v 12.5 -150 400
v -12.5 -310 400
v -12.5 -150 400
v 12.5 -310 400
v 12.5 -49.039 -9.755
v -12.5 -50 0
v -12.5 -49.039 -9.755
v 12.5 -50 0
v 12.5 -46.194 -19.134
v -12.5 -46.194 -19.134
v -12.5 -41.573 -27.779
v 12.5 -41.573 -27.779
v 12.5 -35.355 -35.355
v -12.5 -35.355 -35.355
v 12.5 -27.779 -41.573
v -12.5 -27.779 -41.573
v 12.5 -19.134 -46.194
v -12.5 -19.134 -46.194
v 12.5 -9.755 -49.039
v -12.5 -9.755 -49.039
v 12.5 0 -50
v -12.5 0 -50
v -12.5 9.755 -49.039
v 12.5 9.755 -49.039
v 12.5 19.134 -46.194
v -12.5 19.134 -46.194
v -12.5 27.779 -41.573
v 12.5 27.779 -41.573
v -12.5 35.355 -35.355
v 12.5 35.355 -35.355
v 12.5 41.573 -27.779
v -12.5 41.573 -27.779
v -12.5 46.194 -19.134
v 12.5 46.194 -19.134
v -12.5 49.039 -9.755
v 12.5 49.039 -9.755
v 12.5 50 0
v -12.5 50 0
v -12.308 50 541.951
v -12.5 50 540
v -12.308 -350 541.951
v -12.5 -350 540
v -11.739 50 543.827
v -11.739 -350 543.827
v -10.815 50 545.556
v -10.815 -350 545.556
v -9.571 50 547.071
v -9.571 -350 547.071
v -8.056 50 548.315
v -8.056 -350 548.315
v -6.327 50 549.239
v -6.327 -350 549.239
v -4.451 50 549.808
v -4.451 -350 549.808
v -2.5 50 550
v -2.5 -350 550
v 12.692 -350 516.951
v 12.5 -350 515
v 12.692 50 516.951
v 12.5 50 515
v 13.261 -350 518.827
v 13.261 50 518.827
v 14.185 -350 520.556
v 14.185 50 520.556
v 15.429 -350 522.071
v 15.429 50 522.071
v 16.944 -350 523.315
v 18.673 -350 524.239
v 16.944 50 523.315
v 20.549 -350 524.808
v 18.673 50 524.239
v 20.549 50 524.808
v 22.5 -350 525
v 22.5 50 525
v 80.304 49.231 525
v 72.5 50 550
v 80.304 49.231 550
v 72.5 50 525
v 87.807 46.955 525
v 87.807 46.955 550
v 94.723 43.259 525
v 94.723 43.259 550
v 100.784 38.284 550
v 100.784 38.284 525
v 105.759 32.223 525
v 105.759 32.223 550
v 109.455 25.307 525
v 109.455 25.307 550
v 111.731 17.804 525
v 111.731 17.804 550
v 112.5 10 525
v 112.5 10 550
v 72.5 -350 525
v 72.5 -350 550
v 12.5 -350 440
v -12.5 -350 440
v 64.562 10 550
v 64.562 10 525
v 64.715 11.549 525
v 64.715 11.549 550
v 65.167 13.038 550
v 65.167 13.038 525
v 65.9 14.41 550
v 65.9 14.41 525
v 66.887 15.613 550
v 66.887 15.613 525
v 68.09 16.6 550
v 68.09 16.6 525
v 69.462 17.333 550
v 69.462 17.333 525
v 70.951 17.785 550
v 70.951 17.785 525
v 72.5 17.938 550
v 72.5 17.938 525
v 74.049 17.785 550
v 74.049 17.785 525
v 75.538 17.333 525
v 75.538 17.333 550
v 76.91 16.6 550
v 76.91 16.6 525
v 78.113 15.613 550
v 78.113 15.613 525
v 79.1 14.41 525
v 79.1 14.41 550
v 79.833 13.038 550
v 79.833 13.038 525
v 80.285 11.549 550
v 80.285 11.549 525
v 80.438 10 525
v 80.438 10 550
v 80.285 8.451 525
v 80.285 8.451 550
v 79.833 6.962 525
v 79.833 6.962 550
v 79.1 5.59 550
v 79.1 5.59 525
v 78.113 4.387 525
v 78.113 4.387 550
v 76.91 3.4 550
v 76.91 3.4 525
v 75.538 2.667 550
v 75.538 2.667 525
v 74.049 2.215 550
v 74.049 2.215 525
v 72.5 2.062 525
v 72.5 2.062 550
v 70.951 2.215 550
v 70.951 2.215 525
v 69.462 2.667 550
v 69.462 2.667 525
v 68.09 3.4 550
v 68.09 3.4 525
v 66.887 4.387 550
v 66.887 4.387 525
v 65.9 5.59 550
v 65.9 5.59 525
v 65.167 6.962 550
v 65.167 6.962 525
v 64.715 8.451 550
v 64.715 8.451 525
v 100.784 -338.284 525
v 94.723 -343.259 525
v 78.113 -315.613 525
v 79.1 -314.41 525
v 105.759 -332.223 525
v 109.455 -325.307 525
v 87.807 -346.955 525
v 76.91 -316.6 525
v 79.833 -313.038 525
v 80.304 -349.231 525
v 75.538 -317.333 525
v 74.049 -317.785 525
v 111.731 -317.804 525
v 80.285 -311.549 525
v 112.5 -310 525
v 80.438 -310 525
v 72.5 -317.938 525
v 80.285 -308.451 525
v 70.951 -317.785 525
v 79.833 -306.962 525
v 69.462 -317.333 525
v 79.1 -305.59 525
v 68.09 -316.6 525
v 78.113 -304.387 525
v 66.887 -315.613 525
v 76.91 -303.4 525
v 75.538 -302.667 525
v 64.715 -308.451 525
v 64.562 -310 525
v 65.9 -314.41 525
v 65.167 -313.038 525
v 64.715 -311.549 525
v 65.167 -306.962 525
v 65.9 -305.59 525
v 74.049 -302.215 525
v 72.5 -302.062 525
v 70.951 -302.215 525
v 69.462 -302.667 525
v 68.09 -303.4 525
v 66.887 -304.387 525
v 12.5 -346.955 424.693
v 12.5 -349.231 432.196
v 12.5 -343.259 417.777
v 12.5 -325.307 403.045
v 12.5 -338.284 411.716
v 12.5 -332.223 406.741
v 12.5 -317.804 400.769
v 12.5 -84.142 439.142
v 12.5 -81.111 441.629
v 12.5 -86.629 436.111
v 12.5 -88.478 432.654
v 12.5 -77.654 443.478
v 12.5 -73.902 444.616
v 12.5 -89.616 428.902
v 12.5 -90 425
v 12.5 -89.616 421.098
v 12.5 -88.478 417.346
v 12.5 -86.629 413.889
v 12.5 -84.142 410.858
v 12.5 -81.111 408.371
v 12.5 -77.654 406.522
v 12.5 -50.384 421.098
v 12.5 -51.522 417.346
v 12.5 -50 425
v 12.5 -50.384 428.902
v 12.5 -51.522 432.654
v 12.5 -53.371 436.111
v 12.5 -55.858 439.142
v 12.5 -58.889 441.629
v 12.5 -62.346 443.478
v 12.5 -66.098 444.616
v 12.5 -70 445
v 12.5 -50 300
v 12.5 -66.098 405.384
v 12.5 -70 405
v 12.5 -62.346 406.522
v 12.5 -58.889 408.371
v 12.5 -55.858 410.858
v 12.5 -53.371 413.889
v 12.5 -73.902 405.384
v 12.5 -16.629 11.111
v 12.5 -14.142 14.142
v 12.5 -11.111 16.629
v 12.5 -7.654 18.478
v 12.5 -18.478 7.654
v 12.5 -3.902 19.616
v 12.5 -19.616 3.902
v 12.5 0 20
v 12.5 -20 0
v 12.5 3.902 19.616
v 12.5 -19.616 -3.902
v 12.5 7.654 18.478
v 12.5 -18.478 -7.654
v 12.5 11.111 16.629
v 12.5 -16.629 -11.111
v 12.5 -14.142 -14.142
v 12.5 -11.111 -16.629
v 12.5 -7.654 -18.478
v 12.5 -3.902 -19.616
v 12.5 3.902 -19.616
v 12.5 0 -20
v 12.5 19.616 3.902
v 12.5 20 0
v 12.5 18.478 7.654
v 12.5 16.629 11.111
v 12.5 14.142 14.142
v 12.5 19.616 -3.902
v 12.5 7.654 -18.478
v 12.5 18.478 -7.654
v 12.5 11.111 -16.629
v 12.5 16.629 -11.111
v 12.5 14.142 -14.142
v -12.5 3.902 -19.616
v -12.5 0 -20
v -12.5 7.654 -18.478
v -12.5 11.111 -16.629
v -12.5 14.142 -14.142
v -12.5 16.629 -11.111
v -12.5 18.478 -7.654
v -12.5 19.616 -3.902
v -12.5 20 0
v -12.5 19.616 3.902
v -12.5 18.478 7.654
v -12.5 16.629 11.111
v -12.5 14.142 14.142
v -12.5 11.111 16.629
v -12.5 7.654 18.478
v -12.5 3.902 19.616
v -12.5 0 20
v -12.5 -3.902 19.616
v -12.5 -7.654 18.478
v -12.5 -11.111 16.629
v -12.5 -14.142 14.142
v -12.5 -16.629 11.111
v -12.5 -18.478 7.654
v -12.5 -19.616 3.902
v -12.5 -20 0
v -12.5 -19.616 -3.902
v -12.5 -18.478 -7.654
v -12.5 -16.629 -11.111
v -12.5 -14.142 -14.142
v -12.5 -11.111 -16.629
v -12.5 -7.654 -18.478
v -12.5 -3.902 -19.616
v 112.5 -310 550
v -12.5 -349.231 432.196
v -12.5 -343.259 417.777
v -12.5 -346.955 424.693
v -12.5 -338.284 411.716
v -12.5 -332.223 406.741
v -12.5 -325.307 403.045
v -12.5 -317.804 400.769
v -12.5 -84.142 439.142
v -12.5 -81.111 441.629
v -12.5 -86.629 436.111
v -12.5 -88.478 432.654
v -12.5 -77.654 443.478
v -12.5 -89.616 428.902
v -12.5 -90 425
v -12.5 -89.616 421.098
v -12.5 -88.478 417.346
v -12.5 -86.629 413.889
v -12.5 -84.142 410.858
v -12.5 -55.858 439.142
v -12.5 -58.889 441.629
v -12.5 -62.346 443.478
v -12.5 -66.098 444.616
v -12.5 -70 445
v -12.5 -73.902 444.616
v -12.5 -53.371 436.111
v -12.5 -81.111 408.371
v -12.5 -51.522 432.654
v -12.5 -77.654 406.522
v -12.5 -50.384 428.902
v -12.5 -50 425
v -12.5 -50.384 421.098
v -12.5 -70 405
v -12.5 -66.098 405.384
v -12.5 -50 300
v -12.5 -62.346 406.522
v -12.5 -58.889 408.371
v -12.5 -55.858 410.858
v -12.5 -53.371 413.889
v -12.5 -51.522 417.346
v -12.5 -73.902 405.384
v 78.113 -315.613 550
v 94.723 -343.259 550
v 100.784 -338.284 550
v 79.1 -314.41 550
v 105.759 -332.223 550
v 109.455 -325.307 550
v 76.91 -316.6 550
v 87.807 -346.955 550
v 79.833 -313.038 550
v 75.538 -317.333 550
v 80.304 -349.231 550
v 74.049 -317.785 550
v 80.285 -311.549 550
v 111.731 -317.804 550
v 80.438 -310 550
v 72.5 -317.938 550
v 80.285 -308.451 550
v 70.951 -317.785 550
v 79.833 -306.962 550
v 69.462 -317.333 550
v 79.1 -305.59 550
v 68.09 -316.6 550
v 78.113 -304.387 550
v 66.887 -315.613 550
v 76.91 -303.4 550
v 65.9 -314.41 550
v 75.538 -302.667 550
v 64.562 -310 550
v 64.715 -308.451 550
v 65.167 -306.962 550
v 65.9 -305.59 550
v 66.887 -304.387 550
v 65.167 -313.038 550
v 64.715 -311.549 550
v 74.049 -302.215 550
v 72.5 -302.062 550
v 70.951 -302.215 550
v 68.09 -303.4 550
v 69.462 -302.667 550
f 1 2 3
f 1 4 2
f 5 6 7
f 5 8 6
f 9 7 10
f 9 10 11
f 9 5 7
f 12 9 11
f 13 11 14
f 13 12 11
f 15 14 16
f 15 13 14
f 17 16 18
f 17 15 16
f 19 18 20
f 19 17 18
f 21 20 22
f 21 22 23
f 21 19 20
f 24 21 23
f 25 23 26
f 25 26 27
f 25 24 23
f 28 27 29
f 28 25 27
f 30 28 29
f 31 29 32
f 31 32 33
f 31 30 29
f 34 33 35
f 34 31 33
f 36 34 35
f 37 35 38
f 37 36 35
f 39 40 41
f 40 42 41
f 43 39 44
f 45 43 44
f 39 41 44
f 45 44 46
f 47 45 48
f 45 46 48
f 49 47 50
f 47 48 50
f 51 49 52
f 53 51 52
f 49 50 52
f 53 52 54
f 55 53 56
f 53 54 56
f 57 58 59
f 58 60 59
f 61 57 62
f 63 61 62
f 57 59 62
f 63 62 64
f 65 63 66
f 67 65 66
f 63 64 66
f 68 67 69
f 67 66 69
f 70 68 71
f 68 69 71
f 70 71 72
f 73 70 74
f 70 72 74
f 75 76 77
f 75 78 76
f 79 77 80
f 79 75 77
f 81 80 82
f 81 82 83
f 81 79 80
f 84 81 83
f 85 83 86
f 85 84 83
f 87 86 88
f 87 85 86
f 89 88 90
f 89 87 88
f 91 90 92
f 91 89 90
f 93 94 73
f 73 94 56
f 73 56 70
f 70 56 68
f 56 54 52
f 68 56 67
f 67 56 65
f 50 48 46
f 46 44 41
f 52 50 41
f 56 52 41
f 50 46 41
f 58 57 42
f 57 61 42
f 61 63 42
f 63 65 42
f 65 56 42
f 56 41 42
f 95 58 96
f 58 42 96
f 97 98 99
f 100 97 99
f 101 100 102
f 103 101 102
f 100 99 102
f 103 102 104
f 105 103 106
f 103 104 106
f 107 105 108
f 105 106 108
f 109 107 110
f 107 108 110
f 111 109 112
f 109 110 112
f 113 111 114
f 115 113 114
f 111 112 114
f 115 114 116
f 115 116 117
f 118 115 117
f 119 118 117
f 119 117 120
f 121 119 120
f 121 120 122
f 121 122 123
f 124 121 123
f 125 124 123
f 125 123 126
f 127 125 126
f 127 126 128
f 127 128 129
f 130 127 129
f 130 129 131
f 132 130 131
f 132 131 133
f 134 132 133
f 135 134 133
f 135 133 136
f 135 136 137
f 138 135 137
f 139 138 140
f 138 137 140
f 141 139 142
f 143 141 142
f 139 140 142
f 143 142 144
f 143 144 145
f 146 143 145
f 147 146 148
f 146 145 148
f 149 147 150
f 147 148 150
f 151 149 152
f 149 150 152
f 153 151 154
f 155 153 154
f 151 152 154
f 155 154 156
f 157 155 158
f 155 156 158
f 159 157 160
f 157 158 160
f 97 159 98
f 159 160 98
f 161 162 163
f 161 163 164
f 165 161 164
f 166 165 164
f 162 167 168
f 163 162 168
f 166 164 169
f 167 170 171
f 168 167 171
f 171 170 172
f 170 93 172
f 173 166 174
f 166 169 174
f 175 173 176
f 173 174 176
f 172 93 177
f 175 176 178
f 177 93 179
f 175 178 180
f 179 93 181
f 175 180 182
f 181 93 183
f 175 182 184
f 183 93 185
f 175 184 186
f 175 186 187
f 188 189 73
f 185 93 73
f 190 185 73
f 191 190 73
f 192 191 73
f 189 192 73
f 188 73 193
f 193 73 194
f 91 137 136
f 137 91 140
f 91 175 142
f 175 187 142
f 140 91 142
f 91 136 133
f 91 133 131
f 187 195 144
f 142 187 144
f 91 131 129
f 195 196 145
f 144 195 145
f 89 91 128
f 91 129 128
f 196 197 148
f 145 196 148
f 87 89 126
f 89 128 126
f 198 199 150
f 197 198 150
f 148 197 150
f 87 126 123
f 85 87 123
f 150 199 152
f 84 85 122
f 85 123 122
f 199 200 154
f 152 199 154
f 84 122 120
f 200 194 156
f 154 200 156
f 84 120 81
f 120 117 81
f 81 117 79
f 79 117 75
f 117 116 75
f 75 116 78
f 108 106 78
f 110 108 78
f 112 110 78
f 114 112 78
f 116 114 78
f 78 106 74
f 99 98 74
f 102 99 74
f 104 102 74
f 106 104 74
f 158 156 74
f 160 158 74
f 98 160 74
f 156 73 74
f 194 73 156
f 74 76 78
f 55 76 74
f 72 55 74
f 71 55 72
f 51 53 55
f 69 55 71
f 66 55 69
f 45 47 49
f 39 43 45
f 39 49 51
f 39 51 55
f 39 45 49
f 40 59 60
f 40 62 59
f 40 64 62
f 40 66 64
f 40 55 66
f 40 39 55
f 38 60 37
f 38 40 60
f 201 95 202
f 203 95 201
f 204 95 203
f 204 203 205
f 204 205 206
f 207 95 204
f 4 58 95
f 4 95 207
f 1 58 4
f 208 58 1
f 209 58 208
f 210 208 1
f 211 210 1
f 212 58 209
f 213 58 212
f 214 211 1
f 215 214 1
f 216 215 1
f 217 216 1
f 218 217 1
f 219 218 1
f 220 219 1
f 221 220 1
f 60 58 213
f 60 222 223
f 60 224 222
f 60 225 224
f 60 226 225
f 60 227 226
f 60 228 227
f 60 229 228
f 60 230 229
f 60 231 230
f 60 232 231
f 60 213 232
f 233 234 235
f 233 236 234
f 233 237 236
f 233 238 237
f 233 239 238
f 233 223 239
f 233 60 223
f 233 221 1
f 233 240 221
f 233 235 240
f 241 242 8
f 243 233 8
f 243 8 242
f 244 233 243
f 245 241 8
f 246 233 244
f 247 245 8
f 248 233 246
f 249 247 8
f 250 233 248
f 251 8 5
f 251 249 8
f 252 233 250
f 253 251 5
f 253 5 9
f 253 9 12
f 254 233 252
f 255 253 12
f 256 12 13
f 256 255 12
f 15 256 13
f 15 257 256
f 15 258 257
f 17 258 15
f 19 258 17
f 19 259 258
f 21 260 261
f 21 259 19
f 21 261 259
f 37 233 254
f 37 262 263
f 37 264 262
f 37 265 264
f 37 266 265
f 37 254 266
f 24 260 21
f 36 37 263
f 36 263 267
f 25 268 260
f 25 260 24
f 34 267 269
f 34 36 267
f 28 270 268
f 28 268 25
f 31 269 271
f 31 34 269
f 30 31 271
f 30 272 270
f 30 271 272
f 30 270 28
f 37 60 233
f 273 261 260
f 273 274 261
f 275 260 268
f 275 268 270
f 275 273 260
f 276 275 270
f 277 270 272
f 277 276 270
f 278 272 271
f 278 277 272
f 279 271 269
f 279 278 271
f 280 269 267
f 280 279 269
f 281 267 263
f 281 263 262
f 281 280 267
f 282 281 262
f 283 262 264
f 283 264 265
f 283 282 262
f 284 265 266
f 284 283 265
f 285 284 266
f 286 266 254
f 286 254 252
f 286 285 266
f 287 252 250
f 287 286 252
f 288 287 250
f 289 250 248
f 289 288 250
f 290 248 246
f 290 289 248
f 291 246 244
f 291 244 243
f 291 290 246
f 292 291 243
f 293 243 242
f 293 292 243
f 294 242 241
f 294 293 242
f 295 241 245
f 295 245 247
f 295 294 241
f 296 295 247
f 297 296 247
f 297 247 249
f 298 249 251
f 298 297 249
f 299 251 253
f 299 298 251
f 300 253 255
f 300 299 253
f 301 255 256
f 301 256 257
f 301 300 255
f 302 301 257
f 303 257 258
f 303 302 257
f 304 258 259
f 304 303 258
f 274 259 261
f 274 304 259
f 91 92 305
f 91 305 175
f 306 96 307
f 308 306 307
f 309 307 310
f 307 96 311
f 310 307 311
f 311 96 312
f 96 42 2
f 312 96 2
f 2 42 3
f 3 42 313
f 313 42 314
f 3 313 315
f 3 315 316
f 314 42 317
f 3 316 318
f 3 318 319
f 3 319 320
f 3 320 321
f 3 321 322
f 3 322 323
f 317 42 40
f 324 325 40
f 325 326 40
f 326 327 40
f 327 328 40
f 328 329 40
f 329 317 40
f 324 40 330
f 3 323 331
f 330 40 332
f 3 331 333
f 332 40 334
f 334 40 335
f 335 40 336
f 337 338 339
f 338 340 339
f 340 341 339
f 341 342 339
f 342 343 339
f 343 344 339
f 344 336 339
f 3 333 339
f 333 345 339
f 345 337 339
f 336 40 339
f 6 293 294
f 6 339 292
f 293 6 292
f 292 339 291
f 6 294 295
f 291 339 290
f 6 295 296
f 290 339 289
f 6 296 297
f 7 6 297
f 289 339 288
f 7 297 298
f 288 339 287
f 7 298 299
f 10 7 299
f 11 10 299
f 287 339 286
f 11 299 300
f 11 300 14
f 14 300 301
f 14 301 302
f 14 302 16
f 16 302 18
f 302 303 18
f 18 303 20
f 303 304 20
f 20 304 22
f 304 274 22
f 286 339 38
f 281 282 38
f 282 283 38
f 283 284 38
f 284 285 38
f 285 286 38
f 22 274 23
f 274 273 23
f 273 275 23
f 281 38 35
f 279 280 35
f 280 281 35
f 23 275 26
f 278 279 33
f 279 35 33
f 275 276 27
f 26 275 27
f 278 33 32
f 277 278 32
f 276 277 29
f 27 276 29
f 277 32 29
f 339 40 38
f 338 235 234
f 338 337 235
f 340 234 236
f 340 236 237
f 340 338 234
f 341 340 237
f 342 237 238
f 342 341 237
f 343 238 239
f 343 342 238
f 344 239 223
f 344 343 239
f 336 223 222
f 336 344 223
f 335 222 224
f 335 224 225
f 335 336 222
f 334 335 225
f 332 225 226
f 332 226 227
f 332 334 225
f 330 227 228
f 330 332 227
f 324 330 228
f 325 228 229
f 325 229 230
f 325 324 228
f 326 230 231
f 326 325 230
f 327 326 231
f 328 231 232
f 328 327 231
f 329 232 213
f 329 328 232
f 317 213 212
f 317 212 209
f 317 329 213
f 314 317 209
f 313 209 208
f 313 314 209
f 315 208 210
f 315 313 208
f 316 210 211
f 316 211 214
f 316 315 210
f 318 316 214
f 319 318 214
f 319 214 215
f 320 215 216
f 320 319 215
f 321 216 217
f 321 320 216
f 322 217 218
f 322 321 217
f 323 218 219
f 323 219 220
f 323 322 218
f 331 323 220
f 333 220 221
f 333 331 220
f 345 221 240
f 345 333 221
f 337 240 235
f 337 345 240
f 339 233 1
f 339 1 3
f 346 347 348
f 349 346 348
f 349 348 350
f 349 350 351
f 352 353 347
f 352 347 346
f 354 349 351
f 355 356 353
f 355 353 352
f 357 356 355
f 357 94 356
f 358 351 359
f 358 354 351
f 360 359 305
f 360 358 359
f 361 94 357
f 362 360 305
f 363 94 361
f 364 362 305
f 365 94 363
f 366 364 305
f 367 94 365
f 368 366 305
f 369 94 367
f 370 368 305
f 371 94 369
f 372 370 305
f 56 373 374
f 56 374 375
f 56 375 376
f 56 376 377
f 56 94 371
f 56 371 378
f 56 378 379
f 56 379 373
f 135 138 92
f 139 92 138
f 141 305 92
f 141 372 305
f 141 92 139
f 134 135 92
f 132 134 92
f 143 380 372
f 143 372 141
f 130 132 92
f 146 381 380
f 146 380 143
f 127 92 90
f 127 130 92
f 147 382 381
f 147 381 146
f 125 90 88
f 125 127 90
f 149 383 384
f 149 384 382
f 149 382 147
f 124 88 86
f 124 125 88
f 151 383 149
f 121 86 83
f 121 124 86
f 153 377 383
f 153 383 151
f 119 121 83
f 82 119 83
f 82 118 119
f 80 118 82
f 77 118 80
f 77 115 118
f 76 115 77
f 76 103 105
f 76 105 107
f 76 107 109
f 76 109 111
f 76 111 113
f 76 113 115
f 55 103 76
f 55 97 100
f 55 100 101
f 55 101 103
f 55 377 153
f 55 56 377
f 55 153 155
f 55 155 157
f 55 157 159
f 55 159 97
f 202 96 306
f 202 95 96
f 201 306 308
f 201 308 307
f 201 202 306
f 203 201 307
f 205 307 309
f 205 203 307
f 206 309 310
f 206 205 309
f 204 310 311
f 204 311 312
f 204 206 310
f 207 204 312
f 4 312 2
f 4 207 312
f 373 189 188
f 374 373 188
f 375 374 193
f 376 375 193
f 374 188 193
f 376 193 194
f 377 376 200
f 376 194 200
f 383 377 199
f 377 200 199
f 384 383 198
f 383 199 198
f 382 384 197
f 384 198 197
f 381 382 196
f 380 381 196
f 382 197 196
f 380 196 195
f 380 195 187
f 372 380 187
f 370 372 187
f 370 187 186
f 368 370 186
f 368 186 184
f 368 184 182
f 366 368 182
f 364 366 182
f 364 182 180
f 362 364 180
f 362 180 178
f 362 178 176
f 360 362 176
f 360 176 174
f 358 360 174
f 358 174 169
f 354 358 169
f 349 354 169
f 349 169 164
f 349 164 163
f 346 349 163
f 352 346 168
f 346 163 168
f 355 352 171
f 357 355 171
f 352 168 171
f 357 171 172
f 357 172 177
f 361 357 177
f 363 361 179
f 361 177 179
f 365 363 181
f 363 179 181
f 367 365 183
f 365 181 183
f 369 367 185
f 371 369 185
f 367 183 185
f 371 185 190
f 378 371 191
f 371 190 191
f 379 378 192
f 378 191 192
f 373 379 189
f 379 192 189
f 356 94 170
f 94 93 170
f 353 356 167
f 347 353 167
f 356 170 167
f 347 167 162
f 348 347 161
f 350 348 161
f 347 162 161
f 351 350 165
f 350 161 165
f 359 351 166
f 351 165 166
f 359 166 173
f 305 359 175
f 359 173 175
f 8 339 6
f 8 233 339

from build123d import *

# Parameters (mm, degrees)
SKETCH1_R                    = 20
EXTRUDE1_DEPTH               = 12.5
SKETCH2_W                    = 25
SKETCH2_H                    = 400
EXTRUDE2_DEPTH               = 100
FILLET1_R                    = 40
F_5_8_0_625_DIAMETER_HOLE1_D = 15.875
CHAMFER1_SIZE                = 100
FILLET2_R                    = 10


with BuildPart() as part:
    # Sketch1 → Extrude1 (new, symmetric)
    with BuildSketch(Plane(origin=(0, 0, 0), x_dir=(0, 0, -1), z_dir=(1, 0, 0))):
        with BuildLine():
            Line((0, 50), (-550, 50))
            Line((-550, 50), (-550, -350))
            Line((-550, -350), (-400, -350))
            Line((-400, -350), (-400, -50))
            Line((-400, -50), (0, -50))
            ThreePointArc((0, -50), (50, 0), (0, 50))
        make_face()
        Circle(SKETCH1_R, mode=Mode.SUBTRACT)
        with Locations((-425, -70)):
            Circle(SKETCH1_R, mode=Mode.SUBTRACT)
    extrude(amount=EXTRUDE1_DEPTH, both=True)

    # Sketch2 → Extrude2 (add)
    with BuildSketch(Plane(origin=(12.5, 0, 0), x_dir=(0, 0, -1), z_dir=(1, 0, 0))):
        with Locations((-537.5, -150)):
            Rectangle(SKETCH2_W, SKETCH2_H)
    extrude(amount=EXTRUDE2_DEPTH)

    # Fillet1
    fillet1_edges = [part.edges().sort_by_distance(p)[0] for p in [
        (112.5, -350, 537.5),
        (112.5, 50, 537.5),
        (0, -350, 400),
    ]]
    fillet(fillet1_edges, radius=FILLET1_R)

    # 5/8 (0.625) Diameter Hole1 (through all)
    with Locations(Plane.XY.offset(550)):
        with Locations((72.5, 10), (72.5, -310)):
            Hole(F_5_8_0_625_DIAMETER_HOLE1_D / 2)

    # Chamfer1
    chamfer1_edges = [part.edges().sort_by_distance(p)[0] for p in [
        (0, -50, 400),
    ]]
    chamfer(chamfer1_edges, length=CHAMFER1_SIZE)

    # Fillet2
    fillet2_edges = [part.edges().sort_by_distance(p)[0] for p in [
        (12.5, -150, 525),
        (-12.5, -150, 550),
    ]]
    fillet(fillet2_edges, radius=FILLET2_R)


solid = part.part
